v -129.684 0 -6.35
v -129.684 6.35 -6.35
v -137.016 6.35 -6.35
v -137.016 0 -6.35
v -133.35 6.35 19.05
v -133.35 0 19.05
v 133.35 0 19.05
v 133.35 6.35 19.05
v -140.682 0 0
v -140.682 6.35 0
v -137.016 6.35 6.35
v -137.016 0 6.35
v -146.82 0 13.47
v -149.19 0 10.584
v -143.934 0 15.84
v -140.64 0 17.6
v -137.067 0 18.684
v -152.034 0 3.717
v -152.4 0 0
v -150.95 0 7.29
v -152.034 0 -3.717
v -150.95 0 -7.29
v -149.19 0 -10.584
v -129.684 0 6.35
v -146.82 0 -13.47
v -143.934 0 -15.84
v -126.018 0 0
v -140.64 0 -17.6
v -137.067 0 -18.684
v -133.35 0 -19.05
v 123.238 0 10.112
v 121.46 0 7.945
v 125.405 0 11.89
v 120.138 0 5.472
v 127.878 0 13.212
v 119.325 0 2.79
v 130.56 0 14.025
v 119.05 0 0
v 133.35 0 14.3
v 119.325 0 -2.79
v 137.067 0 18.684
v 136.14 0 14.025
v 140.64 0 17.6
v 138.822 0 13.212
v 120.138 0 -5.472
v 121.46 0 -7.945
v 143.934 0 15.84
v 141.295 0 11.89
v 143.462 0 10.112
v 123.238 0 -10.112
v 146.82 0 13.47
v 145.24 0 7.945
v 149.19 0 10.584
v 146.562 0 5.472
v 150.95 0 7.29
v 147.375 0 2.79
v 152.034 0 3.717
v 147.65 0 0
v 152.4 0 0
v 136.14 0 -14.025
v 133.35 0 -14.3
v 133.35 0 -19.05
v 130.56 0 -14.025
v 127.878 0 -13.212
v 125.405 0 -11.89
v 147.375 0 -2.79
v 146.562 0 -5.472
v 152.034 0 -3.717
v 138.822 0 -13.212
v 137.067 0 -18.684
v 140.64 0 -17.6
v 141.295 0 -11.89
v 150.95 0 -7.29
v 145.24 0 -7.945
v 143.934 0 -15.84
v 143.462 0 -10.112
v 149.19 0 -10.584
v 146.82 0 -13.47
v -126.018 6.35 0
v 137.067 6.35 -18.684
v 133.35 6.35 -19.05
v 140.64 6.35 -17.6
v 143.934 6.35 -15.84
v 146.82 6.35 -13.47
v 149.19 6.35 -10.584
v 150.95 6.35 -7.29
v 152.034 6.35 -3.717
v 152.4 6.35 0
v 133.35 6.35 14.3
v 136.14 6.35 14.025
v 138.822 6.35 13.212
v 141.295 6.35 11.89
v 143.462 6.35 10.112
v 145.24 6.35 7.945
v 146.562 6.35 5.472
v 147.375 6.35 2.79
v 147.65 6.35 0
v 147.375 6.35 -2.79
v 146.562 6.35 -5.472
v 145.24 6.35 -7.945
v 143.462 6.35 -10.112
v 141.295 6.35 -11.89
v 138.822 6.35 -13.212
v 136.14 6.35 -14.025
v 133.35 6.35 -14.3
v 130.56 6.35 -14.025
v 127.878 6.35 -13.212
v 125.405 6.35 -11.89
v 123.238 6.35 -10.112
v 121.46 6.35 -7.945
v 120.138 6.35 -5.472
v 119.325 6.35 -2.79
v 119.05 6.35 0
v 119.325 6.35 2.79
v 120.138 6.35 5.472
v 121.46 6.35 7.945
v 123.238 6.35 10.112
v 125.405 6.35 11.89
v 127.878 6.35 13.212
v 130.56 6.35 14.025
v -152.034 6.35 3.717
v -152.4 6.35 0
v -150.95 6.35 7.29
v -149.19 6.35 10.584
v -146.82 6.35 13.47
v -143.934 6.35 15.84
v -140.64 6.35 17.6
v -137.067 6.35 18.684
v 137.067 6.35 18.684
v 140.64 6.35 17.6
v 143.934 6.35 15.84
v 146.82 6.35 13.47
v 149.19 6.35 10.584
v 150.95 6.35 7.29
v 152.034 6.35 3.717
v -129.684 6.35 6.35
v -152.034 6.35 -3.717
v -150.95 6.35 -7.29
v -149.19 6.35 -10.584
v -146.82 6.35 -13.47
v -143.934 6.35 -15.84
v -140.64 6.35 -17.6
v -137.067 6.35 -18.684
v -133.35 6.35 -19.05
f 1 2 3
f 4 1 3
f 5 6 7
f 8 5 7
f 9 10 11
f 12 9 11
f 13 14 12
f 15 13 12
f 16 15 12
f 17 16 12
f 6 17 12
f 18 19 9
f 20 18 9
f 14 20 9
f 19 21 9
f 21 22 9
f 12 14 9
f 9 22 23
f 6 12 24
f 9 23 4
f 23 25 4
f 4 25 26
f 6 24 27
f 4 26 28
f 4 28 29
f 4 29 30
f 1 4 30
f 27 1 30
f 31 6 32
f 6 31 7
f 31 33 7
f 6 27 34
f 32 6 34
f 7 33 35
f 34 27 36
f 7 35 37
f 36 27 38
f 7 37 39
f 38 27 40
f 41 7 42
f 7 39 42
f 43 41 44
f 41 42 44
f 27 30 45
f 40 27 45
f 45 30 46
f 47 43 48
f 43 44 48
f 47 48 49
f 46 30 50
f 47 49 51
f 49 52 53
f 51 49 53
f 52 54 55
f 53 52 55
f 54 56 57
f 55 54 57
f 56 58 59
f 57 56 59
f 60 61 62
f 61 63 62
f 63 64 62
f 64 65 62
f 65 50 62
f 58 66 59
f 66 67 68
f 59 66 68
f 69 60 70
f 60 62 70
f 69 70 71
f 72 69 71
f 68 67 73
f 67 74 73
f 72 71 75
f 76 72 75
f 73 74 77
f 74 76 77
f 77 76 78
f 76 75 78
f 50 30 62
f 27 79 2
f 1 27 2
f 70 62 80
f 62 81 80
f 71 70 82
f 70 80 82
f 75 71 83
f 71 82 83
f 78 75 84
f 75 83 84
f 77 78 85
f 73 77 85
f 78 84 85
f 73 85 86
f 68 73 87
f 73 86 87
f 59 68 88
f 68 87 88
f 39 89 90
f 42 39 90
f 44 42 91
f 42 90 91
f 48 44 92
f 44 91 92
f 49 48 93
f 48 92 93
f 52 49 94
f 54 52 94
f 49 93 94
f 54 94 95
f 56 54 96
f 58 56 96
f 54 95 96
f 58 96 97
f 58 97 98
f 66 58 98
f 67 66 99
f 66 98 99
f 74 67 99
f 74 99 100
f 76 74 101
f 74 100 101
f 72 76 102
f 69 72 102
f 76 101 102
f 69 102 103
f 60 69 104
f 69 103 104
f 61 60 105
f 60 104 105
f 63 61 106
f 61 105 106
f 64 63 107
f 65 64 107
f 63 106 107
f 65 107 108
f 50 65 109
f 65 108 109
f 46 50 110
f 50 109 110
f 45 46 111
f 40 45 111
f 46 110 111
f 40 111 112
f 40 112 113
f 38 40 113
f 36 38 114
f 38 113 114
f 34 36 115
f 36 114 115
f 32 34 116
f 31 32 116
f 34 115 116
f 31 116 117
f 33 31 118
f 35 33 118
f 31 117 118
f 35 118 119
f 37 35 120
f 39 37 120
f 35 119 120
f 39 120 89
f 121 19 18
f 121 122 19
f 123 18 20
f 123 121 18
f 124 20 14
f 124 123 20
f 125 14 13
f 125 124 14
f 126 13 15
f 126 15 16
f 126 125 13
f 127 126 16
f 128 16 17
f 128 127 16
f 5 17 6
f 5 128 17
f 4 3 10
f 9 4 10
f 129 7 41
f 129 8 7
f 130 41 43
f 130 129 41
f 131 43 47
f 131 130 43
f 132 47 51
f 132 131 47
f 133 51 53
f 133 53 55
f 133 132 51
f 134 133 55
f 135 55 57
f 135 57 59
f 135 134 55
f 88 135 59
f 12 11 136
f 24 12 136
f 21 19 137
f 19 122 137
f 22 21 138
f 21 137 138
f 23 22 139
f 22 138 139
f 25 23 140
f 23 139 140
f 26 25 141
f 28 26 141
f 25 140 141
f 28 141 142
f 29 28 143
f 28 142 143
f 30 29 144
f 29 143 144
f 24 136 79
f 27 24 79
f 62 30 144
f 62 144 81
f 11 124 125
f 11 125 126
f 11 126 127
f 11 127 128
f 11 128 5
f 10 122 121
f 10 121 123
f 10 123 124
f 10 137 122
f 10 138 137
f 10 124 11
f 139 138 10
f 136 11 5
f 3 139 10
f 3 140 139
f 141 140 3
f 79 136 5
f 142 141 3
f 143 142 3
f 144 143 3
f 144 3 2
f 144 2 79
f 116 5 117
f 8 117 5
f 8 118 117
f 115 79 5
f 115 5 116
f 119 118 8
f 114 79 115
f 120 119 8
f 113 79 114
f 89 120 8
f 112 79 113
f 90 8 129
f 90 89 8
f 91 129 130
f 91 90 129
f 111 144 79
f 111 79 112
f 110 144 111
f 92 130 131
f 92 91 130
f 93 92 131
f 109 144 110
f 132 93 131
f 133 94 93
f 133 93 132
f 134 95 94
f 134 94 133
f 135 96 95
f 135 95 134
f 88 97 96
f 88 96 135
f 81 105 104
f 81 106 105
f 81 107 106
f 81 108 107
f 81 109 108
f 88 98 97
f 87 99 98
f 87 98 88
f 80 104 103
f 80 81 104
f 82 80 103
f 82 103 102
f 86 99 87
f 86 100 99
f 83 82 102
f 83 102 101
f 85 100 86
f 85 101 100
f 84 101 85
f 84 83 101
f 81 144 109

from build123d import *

# Parameters (mm, degrees)
SKETCH1_W           = 304.8
SKETCH1_H           = 38.1
BOSS_EXTRUDE1_DEPTH = 6.35
SKETCH2_R           = 14.3002
CUT_EXTRUDE1_DEPTH  = 6.35
CUT_EXTRUDE5_DEPTH  = 6.35
FILLET3_R           = 19.05


with BuildPart() as part:
    # Sketch1 → Boss-Extrude1 (new body)
    with BuildSketch(Plane(origin=(0, 0, 0), x_dir=(1, 0, 0), z_dir=(0, 1, 0))):
        Rectangle(SKETCH1_W, SKETCH1_H)
    extrude(amount=BOSS_EXTRUDE1_DEPTH)

    # Sketch2 → Cut-Extrude1 (cut)
    with BuildSketch(Plane(origin=(0, 6.35, 0), x_dir=(1, 0, 0), z_dir=(0, 1, 0))):
        with Locations(Location((133.35, 0, 0), (0, 0, 270))):
            Circle(SKETCH2_R)
    extrude(amount=-CUT_EXTRUDE1_DEPTH, mode=Mode.SUBTRACT)

    # Sketch8 → Cut-Extrude5 (cut)
    with BuildSketch(Plane(origin=(0, 6.35, 0), x_dir=(1, 0, 0), z_dir=(0, 1, 0))):
        Polygon((-129.683825791, 6.35), (-137.016174209, 6.35), (-140.682348419, 0), (-137.016174209, -6.35), (-129.683825791, -6.35), (-126.017651581, 0), align=None)
    extrude(amount=-CUT_EXTRUDE5_DEPTH, mode=Mode.SUBTRACT)

    # Fillet3
    fillet3_edges = [part.edges().sort_by_distance(p)[0] for p in [
        (152.4, 3.175, 19.05),
        (152.4, 3.175, -19.05),
        (-152.4, 3.175, 19.05),
        (-152.4, 3.175, -19.05),
    ]]
    fillet(fillet3_edges, radius=FILLET3_R - 0.0001)  # a hair under: the kernel refuses the full size


solid = part.part
